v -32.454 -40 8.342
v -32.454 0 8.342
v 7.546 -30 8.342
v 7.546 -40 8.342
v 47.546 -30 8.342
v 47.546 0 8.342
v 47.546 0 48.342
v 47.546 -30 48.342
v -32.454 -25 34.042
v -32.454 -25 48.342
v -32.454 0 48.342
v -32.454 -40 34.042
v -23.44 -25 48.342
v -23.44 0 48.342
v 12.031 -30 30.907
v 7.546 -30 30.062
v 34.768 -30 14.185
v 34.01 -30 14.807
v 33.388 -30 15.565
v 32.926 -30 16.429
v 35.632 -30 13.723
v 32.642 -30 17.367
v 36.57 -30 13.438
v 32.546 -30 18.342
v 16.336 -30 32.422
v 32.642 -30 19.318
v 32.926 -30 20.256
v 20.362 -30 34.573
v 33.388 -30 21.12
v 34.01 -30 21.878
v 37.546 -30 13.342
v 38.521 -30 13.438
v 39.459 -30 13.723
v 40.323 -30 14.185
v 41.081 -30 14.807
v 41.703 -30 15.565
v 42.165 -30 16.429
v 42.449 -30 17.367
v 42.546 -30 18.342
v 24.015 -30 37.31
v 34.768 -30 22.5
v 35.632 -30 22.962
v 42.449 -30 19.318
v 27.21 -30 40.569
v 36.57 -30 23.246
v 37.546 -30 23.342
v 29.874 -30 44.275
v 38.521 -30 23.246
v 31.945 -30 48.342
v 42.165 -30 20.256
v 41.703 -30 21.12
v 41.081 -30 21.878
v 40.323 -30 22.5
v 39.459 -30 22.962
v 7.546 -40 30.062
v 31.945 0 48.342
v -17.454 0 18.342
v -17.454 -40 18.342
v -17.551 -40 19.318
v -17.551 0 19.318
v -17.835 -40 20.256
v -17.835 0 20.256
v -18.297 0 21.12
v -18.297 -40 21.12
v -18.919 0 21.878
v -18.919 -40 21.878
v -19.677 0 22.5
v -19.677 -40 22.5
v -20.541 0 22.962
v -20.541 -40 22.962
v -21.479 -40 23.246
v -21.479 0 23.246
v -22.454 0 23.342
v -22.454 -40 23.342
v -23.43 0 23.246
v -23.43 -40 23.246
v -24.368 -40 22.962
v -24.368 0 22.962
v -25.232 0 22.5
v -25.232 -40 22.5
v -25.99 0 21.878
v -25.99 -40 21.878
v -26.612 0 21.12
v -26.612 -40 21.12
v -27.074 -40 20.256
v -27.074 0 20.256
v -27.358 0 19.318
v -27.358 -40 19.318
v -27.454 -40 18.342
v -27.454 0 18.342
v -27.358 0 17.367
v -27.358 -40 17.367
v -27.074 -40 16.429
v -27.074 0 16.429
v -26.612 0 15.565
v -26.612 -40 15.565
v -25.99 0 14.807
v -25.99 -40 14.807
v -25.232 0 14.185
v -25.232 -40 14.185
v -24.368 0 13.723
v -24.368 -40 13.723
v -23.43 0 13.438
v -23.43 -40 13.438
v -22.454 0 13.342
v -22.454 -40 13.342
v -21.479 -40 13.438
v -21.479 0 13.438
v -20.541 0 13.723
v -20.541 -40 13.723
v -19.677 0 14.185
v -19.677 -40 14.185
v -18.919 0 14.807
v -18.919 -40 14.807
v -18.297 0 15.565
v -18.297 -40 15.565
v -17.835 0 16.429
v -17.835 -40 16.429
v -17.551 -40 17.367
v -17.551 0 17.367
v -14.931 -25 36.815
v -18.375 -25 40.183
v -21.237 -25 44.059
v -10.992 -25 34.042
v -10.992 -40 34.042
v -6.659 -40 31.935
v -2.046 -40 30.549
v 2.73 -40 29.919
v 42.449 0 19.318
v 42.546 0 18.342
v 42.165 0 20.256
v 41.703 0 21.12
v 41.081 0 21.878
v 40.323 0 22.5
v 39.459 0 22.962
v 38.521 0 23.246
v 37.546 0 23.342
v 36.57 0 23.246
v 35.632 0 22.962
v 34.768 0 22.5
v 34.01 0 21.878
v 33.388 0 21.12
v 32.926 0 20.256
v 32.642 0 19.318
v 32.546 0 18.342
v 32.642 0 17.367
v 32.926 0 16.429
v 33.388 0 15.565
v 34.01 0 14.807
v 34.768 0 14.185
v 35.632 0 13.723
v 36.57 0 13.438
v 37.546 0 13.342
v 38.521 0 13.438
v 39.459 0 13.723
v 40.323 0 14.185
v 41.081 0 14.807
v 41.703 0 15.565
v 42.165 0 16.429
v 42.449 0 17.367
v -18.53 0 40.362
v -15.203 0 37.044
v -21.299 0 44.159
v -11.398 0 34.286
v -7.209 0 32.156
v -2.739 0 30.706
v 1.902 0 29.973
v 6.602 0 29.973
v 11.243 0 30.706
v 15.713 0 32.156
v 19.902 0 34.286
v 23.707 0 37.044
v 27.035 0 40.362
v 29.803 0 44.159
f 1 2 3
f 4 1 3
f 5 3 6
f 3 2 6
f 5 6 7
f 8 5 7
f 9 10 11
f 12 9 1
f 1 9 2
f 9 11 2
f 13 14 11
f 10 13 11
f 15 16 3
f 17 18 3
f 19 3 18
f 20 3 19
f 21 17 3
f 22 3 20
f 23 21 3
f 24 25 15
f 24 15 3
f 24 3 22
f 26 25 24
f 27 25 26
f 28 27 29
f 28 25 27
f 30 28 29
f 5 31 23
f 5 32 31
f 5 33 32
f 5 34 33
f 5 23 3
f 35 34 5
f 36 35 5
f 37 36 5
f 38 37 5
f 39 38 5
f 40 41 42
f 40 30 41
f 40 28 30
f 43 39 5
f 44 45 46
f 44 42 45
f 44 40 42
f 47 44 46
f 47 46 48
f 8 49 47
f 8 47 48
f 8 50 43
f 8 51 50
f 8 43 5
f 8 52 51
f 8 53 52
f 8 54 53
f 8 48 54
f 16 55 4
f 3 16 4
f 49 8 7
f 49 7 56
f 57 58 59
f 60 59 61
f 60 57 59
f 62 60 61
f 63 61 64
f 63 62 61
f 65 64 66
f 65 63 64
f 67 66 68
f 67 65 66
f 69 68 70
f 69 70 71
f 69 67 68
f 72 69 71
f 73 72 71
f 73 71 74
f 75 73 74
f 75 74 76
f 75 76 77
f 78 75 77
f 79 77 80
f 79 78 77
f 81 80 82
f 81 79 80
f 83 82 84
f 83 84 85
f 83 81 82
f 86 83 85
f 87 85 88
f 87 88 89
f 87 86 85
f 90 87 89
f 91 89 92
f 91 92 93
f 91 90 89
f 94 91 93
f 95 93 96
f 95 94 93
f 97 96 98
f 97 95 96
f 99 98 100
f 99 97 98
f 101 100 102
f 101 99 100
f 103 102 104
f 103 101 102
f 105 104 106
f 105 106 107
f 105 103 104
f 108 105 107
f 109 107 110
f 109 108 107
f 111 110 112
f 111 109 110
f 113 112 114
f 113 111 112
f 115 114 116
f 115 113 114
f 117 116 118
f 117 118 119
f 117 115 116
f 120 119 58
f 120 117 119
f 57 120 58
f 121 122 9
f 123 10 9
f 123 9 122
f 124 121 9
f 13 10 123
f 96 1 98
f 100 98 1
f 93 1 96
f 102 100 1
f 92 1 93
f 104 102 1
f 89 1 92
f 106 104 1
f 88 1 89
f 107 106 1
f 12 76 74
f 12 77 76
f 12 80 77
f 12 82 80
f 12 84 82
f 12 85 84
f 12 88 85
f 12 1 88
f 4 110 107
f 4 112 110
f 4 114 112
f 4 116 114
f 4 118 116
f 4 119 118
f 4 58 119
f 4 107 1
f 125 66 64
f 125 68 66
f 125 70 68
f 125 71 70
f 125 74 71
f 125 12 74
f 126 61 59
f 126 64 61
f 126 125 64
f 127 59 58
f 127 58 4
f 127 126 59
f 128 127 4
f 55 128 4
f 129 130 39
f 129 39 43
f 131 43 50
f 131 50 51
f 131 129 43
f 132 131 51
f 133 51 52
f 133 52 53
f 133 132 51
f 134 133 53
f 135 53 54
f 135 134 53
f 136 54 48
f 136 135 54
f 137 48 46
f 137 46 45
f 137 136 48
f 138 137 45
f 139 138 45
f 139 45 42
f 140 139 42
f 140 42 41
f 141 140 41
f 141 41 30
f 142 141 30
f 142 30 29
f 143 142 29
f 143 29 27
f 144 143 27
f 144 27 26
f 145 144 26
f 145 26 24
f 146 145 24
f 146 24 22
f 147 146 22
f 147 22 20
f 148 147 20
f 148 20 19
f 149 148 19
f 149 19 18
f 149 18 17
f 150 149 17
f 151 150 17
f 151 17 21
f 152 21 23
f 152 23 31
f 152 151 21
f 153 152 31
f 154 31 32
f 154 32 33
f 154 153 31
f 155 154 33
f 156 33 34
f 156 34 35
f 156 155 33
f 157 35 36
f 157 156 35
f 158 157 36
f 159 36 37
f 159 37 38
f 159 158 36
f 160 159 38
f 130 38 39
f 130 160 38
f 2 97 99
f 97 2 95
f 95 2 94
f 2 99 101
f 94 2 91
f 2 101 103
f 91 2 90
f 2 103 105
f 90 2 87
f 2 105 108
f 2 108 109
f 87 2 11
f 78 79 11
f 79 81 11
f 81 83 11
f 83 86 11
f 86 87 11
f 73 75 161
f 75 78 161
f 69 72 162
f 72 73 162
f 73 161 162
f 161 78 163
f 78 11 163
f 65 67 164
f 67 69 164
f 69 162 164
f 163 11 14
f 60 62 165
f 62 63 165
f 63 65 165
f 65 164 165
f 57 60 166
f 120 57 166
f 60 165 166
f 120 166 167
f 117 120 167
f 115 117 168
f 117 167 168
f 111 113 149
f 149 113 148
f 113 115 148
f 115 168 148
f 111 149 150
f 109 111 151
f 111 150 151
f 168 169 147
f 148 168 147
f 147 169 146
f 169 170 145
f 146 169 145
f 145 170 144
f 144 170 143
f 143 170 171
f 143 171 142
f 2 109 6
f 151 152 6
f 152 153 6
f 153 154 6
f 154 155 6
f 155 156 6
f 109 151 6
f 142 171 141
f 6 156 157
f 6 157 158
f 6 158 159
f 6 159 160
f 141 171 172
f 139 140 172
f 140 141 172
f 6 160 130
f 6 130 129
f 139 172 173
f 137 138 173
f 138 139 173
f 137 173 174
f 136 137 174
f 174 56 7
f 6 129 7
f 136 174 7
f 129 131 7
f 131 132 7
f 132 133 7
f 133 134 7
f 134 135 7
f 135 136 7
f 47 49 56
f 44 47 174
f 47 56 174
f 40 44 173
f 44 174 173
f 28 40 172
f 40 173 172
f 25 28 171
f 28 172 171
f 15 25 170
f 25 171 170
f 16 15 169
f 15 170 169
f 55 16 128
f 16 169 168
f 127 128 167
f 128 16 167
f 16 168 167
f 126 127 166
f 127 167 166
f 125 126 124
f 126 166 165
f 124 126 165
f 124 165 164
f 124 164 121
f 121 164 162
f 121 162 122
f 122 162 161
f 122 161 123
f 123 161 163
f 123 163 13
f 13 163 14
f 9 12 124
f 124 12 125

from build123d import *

# Parameters (mm, degrees)
F0_R     = 5
F1_DEPTH = 40
F2_R     = 5
F3_DEPTH = 10
F5_DEPTH = 15


with BuildPart() as f1:
    # F0 (on Front) → F1 (new body)
    with BuildSketch(Plane.XZ):
        with BuildLine():
            Line((-23.440344, 48.342409), (-32.454428, 48.342409))
            Line((-32.454428, 48.342409), (-32.454428, 8.342409))
            Line((-32.454428, 8.342409), (47.545572, 8.342409))
            Line((47.545572, 8.342409), (47.545572, 48.342409))
            Line((47.545572, 48.342409), (31.944597, 48.342409))
            ThreePointArc((31.944597, 48.342409), (4.252126, 29.880481), (-23.440344, 48.342409))
        make_face()
        with Locations((-22.454428, 18.342409)):
            Circle(F0_R, mode=Mode.SUBTRACT)
        with Locations((37.545572, 18.342409)):
            Circle(F0_R, mode=Mode.SUBTRACT)
    extrude(amount=F1_DEPTH)

    # F2 (on face) → F3 (cut)
    with BuildSketch(Plane.XZ.offset(40)):
        with BuildLine():
            ThreePointArc((31.944597, 48.342409), (22.240368, 35.871666), (7.545572, 30.061809))
            Line((7.545572, 30.061809), (7.545572, 8.342409))
            Line((7.545572, 8.342409), (47.545572, 8.342409))
            Line((47.545572, 8.342409), (47.545572, 48.342409))
            Line((47.545572, 48.342409), (31.944597, 48.342409))
        make_face()
        with Locations((37.545572, 18.342409)):
            Circle(F2_R, mode=Mode.SUBTRACT)
    extrude(amount=-F3_DEPTH, mode=Mode.SUBTRACT)

    # F4 (on face) → F5 (cut)
    with BuildSketch(Plane.XZ.offset(40)):
        Polygon((-32.454428, 34.042006), (-10.991666, 34.042006), (-23.440344, 48.342409), (-32.454428, 48.342409), align=None)
    extrude(amount=-F5_DEPTH, mode=Mode.SUBTRACT)


solid = f1.part
